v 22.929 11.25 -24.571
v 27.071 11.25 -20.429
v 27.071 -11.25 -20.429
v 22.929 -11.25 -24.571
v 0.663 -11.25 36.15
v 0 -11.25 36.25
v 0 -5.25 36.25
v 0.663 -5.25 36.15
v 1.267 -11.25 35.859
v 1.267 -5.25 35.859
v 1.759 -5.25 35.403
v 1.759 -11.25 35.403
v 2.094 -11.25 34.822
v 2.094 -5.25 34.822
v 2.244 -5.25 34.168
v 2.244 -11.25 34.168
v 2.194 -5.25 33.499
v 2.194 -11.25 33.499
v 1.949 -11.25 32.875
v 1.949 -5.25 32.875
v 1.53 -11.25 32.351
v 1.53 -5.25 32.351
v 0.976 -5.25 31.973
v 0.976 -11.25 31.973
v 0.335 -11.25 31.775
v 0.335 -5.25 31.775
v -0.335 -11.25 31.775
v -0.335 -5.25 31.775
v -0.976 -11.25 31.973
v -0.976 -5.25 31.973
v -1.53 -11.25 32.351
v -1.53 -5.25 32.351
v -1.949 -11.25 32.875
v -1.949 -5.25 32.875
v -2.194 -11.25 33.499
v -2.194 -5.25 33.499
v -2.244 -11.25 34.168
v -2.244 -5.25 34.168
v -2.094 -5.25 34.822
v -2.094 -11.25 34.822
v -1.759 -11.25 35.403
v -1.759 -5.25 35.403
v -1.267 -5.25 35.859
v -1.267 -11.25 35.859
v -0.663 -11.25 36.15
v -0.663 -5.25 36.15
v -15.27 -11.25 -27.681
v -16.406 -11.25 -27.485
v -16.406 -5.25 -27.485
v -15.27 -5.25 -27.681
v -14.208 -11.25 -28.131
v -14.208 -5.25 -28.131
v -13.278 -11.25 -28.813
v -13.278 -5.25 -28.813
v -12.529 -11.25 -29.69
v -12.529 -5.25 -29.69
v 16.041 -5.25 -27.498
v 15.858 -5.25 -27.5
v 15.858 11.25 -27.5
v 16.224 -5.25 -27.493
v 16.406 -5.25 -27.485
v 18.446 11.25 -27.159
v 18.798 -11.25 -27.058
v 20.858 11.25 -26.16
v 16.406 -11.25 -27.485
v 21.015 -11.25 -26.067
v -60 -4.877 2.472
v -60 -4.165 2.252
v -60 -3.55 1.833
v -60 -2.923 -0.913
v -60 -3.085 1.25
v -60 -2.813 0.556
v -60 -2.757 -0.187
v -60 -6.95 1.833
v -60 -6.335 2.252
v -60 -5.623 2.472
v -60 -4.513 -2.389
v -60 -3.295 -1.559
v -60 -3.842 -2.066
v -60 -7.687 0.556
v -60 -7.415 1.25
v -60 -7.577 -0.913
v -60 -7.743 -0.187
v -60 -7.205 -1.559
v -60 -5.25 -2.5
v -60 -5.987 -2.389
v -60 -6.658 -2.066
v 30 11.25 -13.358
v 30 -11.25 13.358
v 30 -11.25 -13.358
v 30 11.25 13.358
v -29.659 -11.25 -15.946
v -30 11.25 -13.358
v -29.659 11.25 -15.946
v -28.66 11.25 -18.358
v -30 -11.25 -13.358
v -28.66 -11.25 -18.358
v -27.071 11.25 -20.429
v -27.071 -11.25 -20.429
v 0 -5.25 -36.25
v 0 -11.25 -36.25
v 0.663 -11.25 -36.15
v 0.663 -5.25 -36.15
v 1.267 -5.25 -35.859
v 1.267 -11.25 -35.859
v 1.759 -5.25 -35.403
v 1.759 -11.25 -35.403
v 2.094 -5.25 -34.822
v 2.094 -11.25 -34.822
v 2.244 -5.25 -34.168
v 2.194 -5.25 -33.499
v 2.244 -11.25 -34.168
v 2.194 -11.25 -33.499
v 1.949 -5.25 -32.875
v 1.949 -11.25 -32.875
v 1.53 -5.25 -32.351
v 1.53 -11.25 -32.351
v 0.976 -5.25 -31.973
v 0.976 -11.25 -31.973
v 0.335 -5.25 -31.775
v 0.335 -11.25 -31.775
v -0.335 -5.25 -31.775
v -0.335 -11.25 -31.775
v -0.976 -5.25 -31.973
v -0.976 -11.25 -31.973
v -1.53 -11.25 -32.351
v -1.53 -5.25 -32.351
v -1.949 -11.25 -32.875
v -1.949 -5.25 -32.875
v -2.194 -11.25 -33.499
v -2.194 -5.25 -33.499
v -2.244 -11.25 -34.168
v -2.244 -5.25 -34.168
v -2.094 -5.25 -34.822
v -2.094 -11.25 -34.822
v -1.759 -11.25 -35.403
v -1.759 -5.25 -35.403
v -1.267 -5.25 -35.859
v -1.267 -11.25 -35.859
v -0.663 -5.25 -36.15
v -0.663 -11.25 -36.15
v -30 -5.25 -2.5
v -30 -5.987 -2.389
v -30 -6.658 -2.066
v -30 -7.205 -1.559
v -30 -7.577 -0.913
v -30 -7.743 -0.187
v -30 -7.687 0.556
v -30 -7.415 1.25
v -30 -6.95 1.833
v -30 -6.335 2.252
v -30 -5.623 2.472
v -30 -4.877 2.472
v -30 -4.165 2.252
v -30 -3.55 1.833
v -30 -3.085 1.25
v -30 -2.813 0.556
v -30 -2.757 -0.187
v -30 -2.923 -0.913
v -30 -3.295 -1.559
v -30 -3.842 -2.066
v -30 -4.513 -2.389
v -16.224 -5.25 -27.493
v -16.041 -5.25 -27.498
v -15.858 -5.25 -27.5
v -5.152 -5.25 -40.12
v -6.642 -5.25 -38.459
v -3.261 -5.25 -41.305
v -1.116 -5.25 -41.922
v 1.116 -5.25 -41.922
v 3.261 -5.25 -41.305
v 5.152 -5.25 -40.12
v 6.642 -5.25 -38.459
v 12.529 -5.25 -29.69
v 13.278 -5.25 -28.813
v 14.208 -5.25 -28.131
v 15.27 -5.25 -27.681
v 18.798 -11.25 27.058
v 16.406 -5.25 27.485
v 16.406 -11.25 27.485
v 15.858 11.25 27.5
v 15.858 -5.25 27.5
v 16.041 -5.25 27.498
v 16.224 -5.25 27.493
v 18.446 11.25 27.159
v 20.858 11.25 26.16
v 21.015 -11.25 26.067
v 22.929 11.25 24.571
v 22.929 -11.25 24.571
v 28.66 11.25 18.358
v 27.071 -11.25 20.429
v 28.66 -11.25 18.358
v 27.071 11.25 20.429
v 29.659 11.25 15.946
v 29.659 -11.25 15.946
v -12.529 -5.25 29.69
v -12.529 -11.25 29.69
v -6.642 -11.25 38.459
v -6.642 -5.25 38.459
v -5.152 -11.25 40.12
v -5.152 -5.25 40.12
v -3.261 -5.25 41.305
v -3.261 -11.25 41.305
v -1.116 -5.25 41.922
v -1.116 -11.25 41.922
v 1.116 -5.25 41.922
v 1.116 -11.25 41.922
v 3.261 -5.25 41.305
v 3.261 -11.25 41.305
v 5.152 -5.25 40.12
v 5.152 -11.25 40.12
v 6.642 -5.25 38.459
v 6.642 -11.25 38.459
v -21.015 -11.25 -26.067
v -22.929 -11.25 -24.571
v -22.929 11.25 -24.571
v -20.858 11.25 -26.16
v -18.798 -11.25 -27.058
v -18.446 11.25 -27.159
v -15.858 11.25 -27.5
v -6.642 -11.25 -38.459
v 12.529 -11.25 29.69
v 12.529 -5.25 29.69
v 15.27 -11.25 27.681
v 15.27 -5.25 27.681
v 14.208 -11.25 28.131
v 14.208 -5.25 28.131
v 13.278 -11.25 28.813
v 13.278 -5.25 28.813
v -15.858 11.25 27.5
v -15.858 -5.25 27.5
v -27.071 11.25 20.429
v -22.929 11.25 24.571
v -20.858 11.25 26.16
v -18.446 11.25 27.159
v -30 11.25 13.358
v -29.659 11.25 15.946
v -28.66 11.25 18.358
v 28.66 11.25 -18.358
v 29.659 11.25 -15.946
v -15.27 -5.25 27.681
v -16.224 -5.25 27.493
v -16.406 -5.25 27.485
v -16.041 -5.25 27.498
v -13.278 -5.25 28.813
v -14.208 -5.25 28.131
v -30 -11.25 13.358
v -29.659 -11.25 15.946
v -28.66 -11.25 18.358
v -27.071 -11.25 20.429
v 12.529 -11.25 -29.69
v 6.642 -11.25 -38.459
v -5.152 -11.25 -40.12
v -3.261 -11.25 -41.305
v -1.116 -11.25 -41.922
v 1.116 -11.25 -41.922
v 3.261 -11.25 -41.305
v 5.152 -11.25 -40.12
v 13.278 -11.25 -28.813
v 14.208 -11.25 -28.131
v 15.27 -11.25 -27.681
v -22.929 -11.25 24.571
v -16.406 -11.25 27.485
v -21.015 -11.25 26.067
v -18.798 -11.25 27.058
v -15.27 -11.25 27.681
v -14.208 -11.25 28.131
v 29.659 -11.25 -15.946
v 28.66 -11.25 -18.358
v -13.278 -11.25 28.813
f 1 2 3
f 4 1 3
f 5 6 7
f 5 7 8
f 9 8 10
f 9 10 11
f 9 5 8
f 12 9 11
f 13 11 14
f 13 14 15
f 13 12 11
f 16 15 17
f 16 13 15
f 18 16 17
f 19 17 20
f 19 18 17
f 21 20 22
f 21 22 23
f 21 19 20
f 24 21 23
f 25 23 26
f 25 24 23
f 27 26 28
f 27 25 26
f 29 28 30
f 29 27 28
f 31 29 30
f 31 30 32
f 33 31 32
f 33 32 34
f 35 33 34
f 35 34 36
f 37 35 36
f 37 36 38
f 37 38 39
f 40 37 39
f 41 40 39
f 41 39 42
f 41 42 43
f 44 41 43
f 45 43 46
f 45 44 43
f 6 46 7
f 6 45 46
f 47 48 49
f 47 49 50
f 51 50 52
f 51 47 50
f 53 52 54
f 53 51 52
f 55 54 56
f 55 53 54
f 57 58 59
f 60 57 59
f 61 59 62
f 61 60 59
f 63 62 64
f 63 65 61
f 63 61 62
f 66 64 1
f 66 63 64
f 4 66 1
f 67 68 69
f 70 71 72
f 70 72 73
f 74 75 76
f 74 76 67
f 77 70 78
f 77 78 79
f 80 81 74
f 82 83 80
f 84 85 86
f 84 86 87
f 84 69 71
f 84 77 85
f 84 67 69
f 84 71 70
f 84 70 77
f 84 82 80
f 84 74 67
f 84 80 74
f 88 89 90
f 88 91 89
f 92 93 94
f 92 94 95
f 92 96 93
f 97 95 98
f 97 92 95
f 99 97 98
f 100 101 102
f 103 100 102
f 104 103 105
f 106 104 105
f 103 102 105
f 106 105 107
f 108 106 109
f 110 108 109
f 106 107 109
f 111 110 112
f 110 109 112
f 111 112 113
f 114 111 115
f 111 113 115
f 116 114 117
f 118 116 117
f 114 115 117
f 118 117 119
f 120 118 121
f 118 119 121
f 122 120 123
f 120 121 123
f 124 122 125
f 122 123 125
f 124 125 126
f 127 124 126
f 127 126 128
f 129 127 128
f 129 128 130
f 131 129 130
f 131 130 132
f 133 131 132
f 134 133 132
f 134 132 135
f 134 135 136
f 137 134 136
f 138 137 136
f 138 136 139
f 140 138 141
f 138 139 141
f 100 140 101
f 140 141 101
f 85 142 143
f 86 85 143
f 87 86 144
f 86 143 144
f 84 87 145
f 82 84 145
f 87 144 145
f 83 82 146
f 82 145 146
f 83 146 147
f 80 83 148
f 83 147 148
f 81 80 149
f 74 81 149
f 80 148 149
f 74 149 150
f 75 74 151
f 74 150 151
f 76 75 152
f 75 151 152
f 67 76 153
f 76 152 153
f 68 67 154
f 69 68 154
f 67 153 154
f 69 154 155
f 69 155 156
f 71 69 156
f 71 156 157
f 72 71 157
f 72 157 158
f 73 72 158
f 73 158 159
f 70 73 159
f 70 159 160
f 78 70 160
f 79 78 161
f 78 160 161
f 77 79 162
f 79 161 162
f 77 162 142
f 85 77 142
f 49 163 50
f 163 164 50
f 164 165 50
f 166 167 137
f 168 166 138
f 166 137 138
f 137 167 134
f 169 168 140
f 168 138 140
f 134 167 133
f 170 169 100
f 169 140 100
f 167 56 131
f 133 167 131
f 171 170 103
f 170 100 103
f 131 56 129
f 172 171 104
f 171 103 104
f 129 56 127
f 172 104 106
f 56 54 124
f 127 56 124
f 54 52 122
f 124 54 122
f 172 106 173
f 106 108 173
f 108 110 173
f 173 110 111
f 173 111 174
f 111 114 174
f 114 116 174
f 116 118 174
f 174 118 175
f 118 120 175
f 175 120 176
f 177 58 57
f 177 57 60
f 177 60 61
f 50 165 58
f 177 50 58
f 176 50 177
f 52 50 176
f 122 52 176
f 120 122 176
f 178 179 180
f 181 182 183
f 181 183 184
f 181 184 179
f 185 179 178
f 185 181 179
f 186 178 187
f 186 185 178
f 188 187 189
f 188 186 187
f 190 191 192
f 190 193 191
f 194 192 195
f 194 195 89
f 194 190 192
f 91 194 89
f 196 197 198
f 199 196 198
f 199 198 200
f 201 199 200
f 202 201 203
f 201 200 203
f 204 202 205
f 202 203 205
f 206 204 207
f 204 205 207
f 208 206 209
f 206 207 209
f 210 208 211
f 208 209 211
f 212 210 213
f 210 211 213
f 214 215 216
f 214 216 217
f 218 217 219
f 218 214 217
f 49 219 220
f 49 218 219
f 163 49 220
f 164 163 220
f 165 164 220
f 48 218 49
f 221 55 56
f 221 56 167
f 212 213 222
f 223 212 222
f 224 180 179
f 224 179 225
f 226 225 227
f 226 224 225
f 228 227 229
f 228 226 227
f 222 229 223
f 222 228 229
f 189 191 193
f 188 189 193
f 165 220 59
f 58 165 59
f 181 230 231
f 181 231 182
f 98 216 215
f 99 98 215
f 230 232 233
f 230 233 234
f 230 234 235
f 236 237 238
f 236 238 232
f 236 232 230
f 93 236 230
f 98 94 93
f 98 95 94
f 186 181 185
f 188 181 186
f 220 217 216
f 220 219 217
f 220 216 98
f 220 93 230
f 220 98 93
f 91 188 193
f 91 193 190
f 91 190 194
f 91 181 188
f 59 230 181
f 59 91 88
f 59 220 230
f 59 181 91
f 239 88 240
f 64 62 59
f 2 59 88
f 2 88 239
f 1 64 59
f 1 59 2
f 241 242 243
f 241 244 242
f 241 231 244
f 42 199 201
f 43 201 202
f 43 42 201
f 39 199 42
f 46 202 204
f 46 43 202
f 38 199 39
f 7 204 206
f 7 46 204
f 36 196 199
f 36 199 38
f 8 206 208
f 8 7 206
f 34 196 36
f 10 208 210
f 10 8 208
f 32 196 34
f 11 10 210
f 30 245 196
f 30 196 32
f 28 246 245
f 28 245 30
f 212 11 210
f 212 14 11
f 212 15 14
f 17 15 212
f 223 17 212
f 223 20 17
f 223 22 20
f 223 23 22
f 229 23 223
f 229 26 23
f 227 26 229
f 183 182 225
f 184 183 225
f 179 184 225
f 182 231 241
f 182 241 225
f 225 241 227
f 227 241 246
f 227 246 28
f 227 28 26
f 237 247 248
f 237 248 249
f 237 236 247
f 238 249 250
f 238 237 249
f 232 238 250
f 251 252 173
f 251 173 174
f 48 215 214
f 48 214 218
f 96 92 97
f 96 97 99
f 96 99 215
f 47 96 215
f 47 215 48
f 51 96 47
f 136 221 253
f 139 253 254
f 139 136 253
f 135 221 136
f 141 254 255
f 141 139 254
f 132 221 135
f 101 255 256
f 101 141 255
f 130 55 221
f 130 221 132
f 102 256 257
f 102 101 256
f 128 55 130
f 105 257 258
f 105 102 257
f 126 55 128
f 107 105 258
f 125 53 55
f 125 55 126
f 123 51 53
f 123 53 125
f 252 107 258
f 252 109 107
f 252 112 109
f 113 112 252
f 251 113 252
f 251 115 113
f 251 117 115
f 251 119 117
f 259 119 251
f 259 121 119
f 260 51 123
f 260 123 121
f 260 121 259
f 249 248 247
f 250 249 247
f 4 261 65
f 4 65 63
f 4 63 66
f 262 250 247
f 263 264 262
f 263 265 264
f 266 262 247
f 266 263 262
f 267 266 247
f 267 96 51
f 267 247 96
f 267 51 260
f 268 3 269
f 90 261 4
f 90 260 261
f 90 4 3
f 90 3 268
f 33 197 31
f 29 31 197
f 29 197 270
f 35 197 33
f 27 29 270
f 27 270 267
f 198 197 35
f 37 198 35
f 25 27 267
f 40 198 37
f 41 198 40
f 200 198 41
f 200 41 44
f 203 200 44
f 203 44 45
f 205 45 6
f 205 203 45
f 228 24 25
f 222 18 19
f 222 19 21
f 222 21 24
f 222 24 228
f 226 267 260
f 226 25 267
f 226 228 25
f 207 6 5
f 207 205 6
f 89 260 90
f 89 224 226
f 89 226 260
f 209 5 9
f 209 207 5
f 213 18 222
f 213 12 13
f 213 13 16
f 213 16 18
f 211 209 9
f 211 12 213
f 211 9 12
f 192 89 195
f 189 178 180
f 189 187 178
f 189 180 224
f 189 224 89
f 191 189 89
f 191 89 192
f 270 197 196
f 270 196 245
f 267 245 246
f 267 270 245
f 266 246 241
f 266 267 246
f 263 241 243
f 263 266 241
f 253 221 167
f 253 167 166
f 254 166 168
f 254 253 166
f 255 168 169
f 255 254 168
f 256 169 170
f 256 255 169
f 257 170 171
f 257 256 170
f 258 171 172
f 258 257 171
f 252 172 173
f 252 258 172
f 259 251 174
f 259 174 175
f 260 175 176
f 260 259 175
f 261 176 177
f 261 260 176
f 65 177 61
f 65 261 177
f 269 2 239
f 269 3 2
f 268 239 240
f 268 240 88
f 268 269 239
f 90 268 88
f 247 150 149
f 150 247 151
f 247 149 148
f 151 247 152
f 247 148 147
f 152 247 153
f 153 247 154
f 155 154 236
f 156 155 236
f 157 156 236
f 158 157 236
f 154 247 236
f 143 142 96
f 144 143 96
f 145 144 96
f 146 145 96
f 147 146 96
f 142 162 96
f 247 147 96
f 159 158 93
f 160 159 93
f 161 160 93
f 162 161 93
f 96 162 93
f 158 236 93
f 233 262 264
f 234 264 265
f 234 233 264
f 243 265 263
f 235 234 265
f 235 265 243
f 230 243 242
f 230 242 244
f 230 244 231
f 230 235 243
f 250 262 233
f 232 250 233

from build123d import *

# Parameters (mm, degrees)
SKETCH1_W           = 60
SKETCH1_H           = 55
BOSS_EXTRUDE1_DEPTH = 11.25
SKETCH2_R           = 2.25
BOSS_EXTRUDE2_DEPTH = 6
CHAMFER1_SIZE       = 10
FILLET1_R           = 10
FILLET2_R           = 5
SKETCH3_R           = 2.5
BOSS_EXTRUDE3_DEPTH = 30


with BuildPart() as part:
    # Sketch1 → Boss-Extrude1 (new, symmetric)
    with BuildSketch(Plane(origin=(0, 0, 0), x_dir=(1, 0, 0), z_dir=(0, 1, 0))):
        Rectangle(SKETCH1_W, SKETCH1_H)
    extrude(amount=BOSS_EXTRUDE1_DEPTH, both=True)

    # Sketch2 → Boss-Extrude2 (add)
    with BuildSketch(Plane.XZ.offset(11.25)):
        with BuildLine():
            Line((-14, -27.5), (-6.641845526, -38.459359596))
            ThreePointArc((-6.641845526, -38.459359596), (0, -42), (6.641845526, -38.459359596))
            Line((6.641845526, -38.459359596), (14, -27.5))
            Line((14, -27.5), (-14, -27.5))
        make_face()
        with Locations(Location((0, -34, 0), (0, 0, 270))):
            Circle(SKETCH2_R, mode=Mode.SUBTRACT)
    boss_extrude2 = extrude(amount=-BOSS_EXTRUDE2_DEPTH)

    # Mirror1: Boss-Extrude2 across plane
    add(boss_extrude2.mirror(Plane.XY))

    # Chamfer1
    chamfer1_edges = [part.edges().sort_by_distance(p)[0] for p in [
        (-30, 0, -27.5),
        (30, 0, -27.5),
        (30, 0, 27.5),
        (-30, 0, 27.5),
    ]]
    chamfer(chamfer1_edges, length=CHAMFER1_SIZE)

    # Fillet1
    fillet1_edges = [part.edges().sort_by_distance(p)[0] for p in [
        (20, 0, 27.5),
        (-20, 0, 27.5),
        (-30, 0, -17.5),
        (-30, 0, 17.5),
        (30, 0, -17.5),
        (30, 0, 17.5),
        (-20, 0, -27.5),
        (20, 0, -27.5),
    ]]
    fillet(fillet1_edges, radius=FILLET1_R)

    # Fillet2
    # the kernel refuses this fillet: 5 mm, written as the material it adds along each edge
    with BuildSketch(Plane(origin=(14, -11.25, -27.5), x_dir=(0.9999804368407044, 0, 0.006255072811241643), z_dir=(0, 1, 0)), Plane(origin=(-14, -11.25, 27.5), x_dir=(-0.9999804368407044, 0, -0.006255072811243166), z_dir=(0, 1, 0))) as fillet2_piece_1:
        with BuildLine():
            CenterArc((2.6493765, 4.994091646), FILLET2_R, 214.235948787, 52.978387625)
            Line((-1.484262233, 2.181080656), (-1.897626106, 1.899779557))
            Line((-1.897626106, 1.899779557), (-0.413363873, -0.281301099))
            Line((-0.413363873, -0.281301099), (0.003127536, -0.499990218))
            ThreePointArc((0.003127536, -0.499990218), (1.860955567, -0.488369141), (2.382077328, -0.499409165))
            Line((2.382077328, -0.499409165), (2.406377253, 0))
        make_face()
    extrude(amount=6)
    with BuildSketch(Plane(origin=(-14, -11.25, -27.5), x_dir=(-0.9999804368407044, 0, 0.00625507281124311), z_dir=(0, 1, 0)), Plane(origin=(14, -11.25, 27.5), x_dir=(0.9999804368407044, 0, -0.006255072811241634), z_dir=(0, 1, 0))) as fillet2_piece_2:
        with BuildLine():
            CenterArc((2.6493765, -4.994091646), FILLET2_R, 92.785663588, 52.978387625)
            Line((-1.484262233, -2.181080656), (-1.897626106, -1.899779557))
            Line((-1.897626106, -1.899779557), (-0.413363873, 0.281301099))
            Line((-0.413363873, 0.281301099), (0.003127536, 0.499990218))
            ThreePointArc((0.003127536, 0.499990218), (1.860955567, 0.488369141), (2.382077328, 0.499409165))
            Line((2.382077328, 0.499409165), (2.406377253, 0))
        make_face()
    extrude(amount=6)

    # Sketch3 → Boss-Extrude3 (add)
    with BuildSketch(Plane.ZY.offset(30)):
        with Locations(Location((0, -5.25, 0), (0, 0, 180))):
            Circle(SKETCH3_R)
    extrude(amount=BOSS_EXTRUDE3_DEPTH)


solid = part.part
